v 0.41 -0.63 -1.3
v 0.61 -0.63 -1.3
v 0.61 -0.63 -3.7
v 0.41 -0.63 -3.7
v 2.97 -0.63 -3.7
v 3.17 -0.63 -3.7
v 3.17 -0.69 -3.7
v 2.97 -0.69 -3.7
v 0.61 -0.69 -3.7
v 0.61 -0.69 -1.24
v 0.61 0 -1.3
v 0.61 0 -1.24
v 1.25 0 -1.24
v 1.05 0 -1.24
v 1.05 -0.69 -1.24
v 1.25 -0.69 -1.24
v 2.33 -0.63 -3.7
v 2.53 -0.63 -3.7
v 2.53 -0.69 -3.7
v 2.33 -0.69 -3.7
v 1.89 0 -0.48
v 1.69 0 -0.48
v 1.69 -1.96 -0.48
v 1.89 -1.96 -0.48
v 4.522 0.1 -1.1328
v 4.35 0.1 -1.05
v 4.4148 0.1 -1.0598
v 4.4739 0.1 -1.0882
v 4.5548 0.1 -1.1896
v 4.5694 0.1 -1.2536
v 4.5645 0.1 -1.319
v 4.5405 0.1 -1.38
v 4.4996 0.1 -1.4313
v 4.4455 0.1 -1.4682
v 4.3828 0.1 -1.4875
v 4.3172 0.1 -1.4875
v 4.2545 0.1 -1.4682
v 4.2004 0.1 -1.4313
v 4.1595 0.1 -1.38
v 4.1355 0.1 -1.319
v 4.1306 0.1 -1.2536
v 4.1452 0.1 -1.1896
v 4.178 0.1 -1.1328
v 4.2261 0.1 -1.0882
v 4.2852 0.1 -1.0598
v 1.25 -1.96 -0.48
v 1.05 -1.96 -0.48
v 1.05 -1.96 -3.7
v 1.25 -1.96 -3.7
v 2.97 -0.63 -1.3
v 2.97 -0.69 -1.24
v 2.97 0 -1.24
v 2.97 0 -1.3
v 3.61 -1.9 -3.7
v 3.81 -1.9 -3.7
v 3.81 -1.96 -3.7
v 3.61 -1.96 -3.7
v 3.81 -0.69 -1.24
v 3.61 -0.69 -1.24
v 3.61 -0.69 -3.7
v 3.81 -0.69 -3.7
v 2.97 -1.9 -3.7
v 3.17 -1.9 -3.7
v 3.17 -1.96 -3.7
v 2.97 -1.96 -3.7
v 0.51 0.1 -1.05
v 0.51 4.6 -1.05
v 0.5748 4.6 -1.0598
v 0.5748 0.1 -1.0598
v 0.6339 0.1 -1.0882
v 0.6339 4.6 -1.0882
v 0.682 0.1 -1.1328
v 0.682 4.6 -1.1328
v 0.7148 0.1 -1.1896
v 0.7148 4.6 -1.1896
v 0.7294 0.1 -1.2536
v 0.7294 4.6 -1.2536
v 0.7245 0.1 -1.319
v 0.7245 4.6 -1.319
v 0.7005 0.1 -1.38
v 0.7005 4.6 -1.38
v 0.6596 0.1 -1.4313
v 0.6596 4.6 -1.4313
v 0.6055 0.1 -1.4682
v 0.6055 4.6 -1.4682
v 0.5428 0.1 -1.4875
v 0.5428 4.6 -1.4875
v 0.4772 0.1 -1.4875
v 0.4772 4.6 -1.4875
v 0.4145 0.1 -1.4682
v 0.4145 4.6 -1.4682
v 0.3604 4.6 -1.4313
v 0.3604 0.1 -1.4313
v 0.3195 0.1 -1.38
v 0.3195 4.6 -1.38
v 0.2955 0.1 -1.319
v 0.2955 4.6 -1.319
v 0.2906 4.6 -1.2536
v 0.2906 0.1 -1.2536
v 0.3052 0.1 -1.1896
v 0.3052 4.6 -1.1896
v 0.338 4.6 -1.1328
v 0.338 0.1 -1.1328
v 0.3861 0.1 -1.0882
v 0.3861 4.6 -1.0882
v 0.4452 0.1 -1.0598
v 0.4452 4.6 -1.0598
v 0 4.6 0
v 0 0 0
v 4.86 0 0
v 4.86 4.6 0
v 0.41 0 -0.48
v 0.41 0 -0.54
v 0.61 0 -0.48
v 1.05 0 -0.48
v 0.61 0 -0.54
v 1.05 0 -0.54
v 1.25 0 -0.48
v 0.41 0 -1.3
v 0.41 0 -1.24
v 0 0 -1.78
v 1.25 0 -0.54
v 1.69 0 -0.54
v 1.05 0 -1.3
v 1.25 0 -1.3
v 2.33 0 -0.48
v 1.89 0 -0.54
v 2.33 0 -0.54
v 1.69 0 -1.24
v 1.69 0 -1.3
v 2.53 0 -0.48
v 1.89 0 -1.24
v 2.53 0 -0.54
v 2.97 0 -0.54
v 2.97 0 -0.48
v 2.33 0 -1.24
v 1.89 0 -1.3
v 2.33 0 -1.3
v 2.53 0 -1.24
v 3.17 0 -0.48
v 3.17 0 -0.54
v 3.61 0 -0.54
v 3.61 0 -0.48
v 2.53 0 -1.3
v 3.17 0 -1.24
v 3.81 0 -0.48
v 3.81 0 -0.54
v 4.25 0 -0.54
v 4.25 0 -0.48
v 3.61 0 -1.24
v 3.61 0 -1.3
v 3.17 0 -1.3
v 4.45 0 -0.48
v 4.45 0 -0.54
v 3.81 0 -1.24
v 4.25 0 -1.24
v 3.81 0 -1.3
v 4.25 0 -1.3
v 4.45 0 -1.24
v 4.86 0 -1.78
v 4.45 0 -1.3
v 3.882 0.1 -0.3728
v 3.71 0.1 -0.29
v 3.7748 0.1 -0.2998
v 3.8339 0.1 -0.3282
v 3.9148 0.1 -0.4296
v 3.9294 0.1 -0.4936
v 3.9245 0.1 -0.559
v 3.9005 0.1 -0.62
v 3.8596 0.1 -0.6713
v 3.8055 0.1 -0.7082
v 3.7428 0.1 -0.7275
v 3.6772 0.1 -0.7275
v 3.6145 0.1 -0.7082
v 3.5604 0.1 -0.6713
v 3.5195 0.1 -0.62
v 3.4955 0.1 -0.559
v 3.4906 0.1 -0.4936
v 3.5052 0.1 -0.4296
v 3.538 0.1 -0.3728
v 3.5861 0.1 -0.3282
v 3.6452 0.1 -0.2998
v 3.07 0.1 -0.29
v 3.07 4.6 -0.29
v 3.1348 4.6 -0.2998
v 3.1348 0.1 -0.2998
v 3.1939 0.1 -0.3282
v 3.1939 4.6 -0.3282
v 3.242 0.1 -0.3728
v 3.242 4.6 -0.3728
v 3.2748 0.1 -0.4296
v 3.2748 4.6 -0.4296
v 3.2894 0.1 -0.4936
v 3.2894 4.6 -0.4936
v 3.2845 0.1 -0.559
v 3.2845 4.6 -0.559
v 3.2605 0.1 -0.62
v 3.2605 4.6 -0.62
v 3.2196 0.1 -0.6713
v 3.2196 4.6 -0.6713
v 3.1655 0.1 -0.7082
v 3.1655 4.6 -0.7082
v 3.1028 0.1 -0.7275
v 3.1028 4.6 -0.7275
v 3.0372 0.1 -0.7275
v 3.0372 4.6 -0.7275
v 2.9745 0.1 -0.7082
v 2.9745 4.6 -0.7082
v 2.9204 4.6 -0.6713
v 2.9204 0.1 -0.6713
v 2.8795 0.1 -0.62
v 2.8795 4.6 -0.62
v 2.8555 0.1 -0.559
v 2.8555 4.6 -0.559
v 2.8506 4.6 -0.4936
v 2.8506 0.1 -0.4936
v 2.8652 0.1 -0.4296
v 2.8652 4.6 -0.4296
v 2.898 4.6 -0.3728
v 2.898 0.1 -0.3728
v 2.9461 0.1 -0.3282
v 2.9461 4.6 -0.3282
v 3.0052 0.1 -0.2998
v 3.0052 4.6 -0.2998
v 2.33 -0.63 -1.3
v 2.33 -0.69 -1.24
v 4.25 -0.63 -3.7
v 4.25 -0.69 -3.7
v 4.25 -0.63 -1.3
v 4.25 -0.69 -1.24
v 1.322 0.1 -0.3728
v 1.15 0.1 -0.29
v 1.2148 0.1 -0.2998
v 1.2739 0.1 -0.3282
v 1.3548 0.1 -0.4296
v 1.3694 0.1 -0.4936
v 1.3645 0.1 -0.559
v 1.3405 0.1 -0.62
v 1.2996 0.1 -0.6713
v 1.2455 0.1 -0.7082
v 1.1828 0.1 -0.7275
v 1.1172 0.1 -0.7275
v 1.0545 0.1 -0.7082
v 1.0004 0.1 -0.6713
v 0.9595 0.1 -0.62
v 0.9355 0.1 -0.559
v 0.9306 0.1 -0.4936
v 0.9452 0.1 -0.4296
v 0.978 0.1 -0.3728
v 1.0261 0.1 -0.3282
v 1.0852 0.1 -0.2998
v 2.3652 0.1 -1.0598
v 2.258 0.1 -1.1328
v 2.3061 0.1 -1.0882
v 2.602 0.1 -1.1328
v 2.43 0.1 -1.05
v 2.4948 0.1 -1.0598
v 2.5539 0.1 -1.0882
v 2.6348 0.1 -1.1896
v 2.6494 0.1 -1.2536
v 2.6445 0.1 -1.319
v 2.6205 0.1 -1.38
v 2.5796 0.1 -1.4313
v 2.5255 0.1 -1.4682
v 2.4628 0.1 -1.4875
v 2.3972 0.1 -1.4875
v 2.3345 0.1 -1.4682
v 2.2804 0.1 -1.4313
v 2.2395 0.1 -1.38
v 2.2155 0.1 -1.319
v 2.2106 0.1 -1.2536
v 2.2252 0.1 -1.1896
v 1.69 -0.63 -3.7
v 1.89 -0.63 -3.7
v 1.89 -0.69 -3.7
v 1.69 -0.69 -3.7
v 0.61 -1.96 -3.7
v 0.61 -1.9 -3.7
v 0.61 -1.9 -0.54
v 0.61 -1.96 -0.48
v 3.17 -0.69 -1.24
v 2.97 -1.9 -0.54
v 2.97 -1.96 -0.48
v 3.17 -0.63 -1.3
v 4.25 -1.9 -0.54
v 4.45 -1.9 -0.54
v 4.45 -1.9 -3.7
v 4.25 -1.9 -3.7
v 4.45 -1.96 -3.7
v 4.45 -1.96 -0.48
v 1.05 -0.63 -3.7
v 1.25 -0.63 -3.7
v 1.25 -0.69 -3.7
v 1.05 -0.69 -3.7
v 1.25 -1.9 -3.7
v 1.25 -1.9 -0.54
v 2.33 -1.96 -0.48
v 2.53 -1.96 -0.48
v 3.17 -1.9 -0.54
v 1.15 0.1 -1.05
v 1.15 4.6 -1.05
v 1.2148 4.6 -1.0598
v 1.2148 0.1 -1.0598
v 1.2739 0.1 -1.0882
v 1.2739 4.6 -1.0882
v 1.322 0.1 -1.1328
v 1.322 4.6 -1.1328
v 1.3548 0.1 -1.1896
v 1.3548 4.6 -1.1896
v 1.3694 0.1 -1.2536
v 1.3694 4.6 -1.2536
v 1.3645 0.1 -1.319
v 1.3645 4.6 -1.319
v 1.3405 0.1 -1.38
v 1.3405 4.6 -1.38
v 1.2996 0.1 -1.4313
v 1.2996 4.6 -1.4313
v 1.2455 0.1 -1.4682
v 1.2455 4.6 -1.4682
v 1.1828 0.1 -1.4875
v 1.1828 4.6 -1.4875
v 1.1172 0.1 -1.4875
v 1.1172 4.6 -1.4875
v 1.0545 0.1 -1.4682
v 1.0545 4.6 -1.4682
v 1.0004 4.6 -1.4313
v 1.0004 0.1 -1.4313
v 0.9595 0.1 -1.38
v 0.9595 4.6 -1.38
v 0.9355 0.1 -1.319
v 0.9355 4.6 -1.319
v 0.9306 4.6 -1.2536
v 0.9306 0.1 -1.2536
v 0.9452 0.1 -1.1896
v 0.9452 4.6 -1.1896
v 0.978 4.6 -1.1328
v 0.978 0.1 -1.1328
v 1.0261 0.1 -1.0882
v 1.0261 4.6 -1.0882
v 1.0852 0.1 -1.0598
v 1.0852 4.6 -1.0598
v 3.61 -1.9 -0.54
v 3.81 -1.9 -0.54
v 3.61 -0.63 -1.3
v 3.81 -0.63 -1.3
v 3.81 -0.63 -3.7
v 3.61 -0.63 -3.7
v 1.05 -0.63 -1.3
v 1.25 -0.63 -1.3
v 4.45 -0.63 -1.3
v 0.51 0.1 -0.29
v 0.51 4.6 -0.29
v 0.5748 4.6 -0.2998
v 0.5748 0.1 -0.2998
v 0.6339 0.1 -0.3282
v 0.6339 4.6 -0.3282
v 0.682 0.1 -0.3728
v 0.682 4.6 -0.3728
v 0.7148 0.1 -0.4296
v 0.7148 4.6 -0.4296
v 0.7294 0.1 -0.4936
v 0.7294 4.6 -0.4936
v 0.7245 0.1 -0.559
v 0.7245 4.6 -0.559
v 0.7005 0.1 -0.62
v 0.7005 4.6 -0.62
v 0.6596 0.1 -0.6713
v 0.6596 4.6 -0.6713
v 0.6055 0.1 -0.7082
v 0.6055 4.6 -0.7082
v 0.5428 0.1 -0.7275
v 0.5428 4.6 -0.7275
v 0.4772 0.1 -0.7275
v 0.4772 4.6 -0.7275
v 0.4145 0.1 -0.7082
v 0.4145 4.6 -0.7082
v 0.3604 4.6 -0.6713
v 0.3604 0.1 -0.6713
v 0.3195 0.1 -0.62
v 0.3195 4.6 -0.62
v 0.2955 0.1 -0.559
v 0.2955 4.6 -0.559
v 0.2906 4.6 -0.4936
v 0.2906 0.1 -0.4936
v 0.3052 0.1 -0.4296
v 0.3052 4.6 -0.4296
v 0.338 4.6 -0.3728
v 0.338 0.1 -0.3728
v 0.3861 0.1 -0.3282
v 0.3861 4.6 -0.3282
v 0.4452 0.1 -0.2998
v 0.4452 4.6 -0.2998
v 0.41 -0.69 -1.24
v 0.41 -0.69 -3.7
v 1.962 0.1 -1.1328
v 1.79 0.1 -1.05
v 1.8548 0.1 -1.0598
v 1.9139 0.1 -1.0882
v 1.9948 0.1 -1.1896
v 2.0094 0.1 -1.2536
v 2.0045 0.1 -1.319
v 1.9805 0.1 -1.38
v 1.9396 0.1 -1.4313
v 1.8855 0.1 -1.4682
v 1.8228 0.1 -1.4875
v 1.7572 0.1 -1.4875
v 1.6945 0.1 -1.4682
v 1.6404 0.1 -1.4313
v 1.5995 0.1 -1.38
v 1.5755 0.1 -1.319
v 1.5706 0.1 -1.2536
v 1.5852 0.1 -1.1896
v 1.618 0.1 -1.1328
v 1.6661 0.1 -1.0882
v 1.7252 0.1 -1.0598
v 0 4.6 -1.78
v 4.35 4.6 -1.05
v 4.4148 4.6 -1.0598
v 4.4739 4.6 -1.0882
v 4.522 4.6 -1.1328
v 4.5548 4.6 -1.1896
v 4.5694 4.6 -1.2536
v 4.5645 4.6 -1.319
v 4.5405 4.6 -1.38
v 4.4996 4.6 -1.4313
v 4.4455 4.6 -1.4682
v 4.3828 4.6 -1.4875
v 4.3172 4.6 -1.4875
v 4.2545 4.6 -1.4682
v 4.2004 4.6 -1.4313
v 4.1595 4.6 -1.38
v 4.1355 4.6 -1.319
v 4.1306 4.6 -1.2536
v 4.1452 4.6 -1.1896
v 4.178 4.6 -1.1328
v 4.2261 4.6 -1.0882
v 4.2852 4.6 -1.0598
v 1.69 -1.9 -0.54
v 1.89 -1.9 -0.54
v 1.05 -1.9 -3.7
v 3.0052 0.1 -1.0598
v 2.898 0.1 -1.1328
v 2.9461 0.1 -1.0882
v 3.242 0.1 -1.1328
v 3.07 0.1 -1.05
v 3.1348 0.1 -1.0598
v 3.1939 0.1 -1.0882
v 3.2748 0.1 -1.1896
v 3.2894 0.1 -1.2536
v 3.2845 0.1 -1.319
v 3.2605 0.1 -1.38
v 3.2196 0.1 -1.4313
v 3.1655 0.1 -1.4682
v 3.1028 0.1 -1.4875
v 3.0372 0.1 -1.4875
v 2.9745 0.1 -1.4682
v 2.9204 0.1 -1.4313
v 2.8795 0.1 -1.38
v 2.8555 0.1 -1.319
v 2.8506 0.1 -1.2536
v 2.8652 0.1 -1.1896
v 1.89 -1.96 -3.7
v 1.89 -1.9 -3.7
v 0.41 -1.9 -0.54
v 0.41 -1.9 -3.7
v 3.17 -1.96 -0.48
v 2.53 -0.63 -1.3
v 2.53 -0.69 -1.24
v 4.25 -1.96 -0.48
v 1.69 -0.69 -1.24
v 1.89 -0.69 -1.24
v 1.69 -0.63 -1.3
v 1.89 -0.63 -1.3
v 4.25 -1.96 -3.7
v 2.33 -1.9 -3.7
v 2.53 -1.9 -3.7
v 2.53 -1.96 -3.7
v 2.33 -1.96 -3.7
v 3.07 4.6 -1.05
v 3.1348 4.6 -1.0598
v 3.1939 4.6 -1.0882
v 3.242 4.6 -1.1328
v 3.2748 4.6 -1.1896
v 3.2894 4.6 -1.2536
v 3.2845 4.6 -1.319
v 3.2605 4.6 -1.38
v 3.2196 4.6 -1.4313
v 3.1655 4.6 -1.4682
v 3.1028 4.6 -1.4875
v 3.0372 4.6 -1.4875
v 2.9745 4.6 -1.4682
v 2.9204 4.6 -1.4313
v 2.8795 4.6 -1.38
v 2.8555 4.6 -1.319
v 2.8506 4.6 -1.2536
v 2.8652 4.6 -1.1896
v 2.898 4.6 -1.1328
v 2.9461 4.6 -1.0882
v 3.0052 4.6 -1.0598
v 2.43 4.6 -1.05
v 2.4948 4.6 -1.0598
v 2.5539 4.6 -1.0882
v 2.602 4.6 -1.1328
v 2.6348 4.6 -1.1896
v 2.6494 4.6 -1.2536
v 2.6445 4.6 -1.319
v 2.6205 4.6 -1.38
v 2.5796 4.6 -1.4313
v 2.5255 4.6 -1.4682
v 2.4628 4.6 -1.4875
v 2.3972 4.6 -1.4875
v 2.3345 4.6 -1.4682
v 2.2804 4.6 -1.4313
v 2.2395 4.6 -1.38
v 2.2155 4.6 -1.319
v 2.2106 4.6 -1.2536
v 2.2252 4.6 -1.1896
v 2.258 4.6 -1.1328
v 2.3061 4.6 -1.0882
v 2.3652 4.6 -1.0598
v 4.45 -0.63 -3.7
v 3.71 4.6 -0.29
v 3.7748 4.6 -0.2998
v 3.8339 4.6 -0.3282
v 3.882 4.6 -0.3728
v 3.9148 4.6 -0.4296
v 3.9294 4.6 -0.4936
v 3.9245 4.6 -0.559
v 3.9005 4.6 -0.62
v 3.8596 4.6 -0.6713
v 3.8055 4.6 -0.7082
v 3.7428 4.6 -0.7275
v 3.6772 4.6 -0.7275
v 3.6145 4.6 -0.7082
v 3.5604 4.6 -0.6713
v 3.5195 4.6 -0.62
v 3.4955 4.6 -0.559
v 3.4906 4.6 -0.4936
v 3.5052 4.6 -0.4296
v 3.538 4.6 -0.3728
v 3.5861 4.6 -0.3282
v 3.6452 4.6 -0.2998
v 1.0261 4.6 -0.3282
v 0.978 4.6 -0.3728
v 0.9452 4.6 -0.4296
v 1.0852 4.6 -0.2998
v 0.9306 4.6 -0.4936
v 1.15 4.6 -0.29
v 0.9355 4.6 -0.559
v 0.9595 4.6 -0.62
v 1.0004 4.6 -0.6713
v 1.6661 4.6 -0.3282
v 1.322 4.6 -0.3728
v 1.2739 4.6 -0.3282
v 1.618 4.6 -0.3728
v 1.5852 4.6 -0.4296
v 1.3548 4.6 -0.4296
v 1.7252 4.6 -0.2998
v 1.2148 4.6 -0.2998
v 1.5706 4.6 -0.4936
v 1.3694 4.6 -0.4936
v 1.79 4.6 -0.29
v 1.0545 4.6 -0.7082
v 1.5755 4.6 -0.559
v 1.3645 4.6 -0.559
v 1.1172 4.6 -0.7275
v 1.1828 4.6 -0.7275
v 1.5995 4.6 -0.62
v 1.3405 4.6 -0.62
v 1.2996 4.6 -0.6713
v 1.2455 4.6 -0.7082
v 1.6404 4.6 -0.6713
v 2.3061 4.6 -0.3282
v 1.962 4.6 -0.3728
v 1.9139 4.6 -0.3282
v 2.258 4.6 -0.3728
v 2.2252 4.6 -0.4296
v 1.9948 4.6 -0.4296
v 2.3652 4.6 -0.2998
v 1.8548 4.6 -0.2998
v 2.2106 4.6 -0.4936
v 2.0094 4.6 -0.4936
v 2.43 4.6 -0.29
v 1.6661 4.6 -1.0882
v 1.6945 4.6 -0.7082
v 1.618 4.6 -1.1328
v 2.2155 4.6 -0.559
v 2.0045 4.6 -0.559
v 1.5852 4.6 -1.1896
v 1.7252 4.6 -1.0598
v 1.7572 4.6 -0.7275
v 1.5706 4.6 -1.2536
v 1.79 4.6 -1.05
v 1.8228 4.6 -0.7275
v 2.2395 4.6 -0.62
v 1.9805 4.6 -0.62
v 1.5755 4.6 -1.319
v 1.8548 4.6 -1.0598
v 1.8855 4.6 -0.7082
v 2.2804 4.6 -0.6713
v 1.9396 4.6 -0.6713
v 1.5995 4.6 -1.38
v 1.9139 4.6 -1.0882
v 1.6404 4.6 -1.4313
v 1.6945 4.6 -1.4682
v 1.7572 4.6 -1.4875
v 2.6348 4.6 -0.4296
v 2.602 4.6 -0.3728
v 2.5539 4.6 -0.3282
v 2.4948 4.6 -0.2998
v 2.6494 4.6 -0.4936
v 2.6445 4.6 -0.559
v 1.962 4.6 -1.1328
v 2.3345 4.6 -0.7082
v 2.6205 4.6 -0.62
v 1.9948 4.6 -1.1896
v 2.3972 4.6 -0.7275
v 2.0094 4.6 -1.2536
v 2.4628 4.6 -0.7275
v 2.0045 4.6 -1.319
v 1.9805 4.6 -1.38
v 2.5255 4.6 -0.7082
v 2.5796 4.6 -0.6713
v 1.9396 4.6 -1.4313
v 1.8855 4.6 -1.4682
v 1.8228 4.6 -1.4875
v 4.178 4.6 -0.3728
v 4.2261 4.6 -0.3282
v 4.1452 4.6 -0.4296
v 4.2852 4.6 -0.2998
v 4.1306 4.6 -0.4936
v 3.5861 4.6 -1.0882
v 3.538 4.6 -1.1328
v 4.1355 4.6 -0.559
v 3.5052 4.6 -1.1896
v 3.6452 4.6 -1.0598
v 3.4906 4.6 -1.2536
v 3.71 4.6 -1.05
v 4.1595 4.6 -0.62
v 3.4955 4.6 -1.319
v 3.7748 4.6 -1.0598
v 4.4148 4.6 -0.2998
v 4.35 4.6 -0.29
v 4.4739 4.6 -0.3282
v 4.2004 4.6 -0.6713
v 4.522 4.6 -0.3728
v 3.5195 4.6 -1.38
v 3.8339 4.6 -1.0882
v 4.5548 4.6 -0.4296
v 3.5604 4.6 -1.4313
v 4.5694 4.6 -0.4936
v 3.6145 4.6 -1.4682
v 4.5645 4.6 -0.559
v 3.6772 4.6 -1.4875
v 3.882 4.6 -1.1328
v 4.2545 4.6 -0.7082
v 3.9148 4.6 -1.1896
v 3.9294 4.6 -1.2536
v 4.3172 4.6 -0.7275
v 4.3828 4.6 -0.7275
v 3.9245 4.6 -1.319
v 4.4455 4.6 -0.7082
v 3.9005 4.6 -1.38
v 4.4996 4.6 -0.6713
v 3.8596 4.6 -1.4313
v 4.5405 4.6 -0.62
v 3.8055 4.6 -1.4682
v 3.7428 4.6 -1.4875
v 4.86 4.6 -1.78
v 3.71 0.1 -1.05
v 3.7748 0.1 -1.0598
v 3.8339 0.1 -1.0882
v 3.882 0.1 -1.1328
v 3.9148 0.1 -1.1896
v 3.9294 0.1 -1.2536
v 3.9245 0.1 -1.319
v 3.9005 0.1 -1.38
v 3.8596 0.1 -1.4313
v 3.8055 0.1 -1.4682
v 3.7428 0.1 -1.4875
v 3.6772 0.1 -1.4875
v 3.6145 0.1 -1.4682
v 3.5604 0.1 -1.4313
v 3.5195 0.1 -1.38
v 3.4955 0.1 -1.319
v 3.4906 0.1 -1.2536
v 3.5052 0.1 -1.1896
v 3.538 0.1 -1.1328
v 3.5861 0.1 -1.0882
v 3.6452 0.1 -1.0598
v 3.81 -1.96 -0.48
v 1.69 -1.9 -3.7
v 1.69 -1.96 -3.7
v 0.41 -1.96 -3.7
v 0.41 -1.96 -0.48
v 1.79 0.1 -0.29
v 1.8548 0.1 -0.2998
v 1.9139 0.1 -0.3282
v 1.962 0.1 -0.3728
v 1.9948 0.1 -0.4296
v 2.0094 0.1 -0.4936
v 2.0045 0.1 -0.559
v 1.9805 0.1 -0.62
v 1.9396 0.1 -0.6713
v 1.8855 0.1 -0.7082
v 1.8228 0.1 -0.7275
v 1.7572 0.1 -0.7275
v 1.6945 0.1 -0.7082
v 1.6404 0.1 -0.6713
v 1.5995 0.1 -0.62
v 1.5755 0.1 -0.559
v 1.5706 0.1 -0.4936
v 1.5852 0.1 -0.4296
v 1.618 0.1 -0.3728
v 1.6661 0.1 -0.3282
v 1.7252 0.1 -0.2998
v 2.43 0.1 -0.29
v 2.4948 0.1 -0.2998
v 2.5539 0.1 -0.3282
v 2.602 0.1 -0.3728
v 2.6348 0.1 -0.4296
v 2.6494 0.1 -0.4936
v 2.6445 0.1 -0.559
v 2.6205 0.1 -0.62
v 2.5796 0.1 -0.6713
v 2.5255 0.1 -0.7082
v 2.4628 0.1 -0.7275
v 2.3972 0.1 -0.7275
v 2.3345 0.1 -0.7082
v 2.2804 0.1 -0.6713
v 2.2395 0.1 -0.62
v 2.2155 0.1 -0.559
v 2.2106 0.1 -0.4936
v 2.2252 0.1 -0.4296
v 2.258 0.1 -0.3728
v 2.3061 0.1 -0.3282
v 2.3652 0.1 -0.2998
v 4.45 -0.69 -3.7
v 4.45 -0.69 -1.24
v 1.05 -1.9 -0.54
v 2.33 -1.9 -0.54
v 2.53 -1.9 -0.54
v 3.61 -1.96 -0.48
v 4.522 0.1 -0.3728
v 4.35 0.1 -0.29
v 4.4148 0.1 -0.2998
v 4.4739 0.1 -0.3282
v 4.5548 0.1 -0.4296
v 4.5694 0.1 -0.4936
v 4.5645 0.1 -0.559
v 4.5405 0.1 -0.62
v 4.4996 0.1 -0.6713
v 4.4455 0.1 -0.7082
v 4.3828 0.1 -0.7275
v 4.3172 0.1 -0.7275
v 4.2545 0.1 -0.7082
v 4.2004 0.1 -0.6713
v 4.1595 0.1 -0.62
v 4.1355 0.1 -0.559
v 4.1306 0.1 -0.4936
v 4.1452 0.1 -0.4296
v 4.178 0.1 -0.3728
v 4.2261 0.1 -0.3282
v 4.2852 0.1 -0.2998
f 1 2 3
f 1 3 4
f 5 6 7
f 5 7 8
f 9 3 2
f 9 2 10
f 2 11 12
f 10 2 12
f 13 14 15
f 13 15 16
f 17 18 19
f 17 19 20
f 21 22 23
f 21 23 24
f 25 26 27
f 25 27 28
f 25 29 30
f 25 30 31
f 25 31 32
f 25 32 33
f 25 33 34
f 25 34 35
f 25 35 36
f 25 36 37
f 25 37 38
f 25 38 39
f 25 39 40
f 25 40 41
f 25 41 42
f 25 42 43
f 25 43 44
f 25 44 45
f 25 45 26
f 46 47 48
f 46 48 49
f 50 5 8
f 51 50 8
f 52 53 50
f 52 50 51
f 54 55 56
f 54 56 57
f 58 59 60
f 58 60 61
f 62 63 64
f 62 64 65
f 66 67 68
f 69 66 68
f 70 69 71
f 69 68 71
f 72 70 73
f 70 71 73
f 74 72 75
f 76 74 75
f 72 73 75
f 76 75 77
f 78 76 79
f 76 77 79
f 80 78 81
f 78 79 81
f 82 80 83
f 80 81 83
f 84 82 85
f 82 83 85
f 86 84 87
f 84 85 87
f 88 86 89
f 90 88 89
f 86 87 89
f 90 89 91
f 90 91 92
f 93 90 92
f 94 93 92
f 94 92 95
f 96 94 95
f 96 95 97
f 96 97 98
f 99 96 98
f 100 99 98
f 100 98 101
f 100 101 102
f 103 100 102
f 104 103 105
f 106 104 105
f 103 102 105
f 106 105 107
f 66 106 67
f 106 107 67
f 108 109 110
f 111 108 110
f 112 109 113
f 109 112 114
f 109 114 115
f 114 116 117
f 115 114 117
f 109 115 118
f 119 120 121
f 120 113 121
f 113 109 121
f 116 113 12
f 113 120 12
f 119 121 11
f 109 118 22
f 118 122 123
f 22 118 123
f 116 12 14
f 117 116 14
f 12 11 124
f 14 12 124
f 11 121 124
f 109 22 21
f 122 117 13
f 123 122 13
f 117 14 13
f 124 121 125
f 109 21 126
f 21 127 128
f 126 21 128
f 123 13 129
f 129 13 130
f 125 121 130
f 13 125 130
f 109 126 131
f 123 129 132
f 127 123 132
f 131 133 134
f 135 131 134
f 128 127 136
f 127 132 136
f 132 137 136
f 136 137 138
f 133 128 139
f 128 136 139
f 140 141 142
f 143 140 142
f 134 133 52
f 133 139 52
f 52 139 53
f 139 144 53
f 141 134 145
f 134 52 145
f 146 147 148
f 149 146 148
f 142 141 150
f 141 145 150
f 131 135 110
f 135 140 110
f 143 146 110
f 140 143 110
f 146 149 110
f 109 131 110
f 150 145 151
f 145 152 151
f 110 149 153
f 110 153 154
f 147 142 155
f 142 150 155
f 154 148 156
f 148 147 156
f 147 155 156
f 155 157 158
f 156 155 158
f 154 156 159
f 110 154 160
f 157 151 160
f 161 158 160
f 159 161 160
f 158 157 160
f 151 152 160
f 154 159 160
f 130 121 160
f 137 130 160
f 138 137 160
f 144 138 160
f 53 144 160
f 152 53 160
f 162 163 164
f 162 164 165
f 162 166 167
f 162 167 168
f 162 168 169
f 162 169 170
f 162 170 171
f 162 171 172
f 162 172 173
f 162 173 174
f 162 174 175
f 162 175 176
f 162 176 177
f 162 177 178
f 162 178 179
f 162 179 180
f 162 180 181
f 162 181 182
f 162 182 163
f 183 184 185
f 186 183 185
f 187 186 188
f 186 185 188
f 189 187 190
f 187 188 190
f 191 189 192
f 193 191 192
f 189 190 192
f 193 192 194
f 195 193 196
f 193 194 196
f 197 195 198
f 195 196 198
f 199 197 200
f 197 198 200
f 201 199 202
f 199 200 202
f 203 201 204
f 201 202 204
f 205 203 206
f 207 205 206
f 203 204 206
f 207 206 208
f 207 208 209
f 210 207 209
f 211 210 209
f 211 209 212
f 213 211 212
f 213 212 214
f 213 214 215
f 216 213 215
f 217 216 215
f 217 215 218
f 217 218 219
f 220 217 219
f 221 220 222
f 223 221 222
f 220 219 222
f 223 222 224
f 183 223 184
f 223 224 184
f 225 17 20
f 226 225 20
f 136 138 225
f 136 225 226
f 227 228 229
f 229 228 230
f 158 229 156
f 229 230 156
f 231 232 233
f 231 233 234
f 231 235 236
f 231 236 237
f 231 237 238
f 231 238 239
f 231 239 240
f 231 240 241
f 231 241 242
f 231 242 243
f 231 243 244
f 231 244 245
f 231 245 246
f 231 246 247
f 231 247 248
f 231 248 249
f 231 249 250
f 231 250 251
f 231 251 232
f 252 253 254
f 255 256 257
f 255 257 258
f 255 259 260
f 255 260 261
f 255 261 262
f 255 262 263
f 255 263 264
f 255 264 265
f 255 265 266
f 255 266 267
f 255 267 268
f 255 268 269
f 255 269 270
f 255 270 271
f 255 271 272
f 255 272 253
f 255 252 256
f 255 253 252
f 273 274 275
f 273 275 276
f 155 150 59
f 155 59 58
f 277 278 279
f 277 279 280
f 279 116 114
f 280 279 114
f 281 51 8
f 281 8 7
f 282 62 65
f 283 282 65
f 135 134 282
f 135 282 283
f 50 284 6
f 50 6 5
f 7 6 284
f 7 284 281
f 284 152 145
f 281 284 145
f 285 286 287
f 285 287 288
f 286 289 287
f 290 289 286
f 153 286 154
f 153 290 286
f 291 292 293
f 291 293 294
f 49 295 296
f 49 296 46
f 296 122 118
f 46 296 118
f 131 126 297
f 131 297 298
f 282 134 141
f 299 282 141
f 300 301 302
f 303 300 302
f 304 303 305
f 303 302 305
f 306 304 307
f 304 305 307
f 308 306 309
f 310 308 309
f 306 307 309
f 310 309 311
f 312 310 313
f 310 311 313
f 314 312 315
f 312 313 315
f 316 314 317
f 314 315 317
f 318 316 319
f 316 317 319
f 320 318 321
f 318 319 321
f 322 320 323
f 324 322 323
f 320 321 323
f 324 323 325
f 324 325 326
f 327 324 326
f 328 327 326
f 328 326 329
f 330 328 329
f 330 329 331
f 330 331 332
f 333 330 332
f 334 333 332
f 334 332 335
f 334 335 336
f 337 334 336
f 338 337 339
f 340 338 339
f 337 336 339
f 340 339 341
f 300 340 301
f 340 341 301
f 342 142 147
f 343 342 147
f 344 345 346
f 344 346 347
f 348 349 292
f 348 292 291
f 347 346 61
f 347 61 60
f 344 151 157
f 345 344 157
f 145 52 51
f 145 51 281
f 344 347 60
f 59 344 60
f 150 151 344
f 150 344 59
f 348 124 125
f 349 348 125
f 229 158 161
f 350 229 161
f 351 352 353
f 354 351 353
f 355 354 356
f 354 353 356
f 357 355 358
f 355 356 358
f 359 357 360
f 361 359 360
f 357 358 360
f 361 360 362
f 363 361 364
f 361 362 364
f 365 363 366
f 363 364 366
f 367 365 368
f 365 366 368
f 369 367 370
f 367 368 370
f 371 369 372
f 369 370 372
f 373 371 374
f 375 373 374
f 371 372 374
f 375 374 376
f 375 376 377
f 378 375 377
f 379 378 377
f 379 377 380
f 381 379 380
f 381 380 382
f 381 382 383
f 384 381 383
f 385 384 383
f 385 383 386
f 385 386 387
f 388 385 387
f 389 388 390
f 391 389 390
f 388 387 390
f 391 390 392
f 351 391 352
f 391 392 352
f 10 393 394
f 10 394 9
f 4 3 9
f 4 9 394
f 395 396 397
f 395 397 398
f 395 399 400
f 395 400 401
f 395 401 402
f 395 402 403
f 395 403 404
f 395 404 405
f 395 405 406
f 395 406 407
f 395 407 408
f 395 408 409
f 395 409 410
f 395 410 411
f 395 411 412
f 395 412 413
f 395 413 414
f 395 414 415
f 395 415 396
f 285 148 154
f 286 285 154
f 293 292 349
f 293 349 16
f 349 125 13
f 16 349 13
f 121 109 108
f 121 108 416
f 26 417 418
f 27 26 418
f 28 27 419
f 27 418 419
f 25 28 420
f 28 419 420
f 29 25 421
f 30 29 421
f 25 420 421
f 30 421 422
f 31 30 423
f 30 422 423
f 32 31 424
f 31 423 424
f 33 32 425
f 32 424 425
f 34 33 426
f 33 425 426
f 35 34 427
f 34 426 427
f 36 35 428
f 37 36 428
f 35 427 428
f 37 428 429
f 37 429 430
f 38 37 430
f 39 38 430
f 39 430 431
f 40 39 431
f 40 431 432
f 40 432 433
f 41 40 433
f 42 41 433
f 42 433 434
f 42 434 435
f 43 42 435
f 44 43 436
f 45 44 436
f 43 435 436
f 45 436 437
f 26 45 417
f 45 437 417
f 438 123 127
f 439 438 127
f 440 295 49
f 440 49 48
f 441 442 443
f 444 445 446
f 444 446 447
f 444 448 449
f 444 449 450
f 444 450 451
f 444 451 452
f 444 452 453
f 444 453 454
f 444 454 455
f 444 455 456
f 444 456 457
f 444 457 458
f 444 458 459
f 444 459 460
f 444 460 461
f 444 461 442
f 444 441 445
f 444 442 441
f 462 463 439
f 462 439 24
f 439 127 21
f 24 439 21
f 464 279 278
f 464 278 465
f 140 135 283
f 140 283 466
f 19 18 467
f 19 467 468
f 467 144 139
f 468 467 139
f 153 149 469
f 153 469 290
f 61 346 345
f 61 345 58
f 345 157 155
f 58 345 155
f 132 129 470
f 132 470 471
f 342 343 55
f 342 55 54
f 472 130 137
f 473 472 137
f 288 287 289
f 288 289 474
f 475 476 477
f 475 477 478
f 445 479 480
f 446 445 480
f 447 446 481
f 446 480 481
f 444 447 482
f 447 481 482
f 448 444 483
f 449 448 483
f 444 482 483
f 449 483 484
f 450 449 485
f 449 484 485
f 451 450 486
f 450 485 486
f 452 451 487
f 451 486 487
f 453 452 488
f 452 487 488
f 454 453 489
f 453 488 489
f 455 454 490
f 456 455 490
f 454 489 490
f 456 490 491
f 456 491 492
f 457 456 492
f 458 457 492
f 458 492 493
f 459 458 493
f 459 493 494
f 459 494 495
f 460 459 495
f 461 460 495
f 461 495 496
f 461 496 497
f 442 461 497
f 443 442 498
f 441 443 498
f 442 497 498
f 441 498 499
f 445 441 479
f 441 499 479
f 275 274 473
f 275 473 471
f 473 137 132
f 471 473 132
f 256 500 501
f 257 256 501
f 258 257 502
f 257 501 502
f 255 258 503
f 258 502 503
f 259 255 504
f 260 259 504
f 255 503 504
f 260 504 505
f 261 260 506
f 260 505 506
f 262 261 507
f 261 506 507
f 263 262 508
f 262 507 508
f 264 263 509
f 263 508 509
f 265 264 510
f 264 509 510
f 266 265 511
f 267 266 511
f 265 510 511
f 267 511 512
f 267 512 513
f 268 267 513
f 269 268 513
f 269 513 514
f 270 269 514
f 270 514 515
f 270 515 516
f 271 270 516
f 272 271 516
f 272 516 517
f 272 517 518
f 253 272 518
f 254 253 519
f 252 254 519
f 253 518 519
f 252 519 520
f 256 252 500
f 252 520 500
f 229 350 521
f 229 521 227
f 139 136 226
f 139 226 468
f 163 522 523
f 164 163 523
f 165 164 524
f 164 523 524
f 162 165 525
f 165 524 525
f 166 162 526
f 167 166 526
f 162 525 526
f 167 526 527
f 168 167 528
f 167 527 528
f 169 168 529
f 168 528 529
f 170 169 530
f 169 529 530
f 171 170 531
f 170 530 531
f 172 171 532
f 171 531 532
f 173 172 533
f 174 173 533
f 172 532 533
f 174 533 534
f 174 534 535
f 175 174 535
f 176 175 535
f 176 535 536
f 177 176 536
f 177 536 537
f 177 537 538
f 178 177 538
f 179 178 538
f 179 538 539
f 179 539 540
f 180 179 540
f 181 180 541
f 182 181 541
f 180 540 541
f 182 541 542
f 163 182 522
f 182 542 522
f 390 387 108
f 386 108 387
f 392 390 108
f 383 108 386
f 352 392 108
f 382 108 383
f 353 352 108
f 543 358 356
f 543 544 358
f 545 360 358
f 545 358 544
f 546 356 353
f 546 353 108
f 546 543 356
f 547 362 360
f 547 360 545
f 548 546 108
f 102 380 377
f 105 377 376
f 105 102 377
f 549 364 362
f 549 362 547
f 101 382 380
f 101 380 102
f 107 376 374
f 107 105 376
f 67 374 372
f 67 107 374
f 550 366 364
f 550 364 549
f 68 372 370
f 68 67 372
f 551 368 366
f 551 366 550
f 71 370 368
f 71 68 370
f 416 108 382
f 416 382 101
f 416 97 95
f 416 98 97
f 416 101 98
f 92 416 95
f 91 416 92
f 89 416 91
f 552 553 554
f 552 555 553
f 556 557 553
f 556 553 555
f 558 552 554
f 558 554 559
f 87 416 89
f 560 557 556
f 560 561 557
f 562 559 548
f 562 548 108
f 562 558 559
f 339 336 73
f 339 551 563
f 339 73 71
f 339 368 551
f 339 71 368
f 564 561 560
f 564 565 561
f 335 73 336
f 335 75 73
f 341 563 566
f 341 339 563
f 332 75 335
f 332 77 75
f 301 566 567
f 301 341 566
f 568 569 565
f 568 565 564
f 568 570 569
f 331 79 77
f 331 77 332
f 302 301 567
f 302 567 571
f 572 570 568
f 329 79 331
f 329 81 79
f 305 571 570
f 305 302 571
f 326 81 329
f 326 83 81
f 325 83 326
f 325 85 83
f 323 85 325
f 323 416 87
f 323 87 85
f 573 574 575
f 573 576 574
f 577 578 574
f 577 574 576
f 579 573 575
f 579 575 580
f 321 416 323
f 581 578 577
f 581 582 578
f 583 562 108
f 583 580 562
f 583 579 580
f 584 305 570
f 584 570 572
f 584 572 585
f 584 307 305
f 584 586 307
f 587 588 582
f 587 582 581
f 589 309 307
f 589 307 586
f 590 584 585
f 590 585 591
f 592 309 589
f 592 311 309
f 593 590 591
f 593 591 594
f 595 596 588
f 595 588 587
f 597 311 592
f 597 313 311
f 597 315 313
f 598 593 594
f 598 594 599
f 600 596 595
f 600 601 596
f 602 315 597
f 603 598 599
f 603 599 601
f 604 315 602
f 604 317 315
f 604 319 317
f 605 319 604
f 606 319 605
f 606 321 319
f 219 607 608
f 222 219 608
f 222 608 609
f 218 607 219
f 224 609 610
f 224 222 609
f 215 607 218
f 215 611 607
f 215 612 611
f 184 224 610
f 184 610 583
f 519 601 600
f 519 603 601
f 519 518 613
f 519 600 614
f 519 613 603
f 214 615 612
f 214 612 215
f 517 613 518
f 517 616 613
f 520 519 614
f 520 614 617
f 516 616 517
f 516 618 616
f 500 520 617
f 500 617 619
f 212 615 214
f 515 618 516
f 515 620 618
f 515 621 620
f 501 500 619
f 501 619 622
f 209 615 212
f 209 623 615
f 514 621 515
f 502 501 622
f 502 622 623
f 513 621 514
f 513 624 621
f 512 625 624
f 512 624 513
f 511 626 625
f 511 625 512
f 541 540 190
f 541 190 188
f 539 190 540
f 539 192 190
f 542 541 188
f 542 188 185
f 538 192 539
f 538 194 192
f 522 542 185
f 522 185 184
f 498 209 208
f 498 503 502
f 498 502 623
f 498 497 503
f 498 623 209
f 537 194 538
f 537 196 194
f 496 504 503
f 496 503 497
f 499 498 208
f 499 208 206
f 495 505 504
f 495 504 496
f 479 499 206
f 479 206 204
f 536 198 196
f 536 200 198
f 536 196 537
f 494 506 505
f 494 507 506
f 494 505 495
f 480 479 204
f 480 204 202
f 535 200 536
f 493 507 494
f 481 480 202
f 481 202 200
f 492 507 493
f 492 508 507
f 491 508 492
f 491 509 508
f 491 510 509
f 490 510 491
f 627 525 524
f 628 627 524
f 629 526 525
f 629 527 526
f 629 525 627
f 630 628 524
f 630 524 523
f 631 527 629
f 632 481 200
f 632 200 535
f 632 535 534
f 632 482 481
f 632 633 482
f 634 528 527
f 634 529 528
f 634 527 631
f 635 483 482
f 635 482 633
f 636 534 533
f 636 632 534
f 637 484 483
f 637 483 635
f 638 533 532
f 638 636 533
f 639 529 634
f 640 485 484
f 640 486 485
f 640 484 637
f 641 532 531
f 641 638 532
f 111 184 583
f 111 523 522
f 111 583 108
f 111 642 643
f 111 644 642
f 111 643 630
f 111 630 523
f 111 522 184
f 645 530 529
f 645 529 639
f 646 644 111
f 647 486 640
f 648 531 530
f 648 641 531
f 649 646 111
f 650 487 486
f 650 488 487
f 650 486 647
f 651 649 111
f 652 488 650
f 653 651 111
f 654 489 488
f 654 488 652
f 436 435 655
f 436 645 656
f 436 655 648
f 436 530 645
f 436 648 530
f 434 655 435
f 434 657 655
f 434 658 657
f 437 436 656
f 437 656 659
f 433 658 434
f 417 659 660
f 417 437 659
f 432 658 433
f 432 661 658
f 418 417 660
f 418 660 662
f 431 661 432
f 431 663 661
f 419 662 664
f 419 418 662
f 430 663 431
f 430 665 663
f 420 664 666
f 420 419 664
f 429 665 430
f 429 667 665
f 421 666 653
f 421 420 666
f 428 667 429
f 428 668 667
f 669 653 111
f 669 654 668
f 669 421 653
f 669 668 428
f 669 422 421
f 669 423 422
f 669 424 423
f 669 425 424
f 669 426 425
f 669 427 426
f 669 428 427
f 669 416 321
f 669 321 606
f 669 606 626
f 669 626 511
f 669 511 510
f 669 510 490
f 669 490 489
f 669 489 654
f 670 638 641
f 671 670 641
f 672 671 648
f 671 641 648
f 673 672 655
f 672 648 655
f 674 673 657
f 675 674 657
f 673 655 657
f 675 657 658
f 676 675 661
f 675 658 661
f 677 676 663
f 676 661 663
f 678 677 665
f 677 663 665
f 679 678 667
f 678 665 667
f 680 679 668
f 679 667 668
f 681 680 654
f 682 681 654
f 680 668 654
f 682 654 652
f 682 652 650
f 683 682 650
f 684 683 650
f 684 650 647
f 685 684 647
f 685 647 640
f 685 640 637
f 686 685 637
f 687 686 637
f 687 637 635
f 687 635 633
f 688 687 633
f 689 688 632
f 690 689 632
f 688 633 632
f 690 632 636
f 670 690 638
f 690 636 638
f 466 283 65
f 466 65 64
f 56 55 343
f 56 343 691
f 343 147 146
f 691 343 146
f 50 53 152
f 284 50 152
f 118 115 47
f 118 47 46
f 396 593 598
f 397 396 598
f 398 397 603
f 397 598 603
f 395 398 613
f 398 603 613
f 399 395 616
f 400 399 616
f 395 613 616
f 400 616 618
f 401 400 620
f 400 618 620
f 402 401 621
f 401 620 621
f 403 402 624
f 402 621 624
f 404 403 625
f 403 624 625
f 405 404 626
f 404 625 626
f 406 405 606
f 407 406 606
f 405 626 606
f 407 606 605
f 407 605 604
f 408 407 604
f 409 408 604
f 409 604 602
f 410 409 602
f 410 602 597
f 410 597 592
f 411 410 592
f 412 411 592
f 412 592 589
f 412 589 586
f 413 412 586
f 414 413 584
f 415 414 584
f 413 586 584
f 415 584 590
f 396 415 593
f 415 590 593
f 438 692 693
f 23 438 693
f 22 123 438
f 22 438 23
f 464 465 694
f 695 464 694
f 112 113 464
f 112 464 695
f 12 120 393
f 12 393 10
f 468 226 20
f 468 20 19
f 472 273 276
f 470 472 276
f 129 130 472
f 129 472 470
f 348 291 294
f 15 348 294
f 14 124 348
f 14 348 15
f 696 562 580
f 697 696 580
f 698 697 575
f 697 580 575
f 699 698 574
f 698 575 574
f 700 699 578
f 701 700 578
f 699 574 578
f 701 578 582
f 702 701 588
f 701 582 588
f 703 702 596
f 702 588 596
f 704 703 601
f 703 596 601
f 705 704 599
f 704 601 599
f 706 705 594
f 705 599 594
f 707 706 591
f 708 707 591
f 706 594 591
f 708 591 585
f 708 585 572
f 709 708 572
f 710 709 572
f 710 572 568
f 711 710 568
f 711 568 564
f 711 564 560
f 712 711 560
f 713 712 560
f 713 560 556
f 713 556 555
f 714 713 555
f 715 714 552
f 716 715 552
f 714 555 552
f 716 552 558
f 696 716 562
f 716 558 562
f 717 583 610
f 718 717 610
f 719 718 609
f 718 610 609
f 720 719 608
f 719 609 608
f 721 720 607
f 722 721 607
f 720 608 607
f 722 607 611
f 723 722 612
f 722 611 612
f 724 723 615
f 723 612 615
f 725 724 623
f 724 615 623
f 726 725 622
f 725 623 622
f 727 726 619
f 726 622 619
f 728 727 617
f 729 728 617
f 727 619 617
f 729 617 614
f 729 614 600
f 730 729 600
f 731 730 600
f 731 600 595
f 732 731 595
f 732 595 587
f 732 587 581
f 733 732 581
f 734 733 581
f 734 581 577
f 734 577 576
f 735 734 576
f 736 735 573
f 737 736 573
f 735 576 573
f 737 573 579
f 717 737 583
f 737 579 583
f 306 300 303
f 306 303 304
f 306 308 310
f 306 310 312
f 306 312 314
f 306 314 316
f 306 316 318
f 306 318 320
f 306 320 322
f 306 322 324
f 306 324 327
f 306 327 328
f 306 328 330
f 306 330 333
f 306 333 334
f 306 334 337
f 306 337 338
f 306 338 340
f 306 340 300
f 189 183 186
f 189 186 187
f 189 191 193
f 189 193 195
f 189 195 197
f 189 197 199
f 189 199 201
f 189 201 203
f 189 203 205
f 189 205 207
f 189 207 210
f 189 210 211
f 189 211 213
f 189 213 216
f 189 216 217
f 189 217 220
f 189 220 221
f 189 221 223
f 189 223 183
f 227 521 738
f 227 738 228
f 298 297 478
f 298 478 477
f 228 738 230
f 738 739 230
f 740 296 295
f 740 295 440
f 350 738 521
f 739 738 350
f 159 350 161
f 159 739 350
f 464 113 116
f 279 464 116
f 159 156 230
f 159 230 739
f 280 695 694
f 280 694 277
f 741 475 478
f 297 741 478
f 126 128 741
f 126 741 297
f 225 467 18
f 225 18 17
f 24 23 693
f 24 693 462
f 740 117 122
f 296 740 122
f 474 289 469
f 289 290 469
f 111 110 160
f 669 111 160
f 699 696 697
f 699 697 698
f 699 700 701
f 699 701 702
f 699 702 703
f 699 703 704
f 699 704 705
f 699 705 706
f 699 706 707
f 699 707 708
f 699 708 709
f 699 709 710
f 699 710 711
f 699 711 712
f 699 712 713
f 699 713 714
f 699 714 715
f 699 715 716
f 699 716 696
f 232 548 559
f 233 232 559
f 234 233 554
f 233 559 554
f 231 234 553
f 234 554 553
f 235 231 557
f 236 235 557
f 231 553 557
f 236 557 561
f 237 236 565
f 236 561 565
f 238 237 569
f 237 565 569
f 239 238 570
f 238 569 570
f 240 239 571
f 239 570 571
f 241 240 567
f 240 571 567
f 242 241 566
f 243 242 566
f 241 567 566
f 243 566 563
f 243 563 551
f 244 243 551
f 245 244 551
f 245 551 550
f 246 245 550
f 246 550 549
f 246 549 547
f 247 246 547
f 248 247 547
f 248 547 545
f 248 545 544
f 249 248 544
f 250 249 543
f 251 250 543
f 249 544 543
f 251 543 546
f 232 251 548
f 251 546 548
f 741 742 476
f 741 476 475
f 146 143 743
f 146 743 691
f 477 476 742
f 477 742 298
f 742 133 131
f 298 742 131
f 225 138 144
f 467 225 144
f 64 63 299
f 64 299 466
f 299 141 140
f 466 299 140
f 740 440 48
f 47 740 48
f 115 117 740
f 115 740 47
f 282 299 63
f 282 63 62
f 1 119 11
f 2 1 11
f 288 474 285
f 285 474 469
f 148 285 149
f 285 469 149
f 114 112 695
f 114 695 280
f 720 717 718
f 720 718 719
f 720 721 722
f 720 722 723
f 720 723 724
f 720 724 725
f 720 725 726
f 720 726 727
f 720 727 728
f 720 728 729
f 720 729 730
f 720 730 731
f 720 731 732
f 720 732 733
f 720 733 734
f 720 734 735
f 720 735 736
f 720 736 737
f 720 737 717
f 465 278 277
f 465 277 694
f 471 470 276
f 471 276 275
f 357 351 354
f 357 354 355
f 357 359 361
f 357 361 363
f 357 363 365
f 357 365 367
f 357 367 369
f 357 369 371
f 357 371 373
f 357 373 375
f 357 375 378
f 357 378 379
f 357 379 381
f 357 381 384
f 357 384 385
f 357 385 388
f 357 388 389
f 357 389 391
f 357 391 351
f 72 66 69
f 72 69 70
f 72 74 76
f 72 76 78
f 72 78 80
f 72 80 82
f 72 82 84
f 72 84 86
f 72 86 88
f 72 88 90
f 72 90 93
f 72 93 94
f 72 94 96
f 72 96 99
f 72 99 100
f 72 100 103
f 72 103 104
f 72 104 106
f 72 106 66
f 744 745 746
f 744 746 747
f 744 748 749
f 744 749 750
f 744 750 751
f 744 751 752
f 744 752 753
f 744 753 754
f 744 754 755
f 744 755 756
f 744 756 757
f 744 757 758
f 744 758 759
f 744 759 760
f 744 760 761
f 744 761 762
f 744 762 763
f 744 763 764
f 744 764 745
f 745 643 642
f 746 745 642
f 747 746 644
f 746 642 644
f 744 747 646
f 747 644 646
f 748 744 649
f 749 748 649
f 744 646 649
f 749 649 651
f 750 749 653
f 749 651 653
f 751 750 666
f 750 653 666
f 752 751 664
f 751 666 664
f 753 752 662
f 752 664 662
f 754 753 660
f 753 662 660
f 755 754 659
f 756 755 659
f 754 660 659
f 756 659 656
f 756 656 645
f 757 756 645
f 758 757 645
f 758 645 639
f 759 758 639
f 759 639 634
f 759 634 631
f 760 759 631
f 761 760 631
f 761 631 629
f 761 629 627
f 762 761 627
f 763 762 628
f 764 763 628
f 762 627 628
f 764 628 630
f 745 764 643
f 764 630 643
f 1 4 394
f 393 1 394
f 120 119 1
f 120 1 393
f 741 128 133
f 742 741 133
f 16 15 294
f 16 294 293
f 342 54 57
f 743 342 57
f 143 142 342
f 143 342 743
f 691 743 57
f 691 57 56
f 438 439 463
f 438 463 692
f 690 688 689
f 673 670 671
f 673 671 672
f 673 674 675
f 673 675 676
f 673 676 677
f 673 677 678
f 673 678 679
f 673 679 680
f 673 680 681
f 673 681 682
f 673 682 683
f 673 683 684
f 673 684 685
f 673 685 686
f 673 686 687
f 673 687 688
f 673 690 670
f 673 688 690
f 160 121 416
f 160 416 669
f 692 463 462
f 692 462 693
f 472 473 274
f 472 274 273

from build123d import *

# Parameters (mm, degrees)
SKETCH2_W           = 4.86
SKETCH2_H           = 1.78
BOSS_EXTRUDE1_DEPTH = 4.6
SKETCH3_R           = 0.22
CUT_EXTRUDE1_DEPTH  = 4.5
SKETCH4_W           = 0.2
SKETCH4_H           = 0.06
BOSS_EXTRUDE2_DEPTH = 1.96
SKETCH6_W           = 0.2
SKETCH6_H           = 0.06
BOSS_EXTRUDE3_DEPTH = 0.69
SKETCH7_W           = 0.2
SKETCH7_H           = 0.06
BOSS_EXTRUDE4_DEPTH = 2.4
SKETCH8_W           = 0.2
SKETCH8_H           = 0.06
BOSS_EXTRUDE5_DEPTH = 3.16


with BuildPart() as part:
    # Sketch2 → Boss-Extrude1 (new body)
    with BuildSketch(Plane(origin=(0, 0, 0), x_dir=(1, 0, 0), z_dir=(0, 1, 0))):
        with Locations((2.43, 0.89)):
            Rectangle(SKETCH2_W, SKETCH2_H)
    extrude(amount=BOSS_EXTRUDE1_DEPTH)

    # Sketch3 → Cut-Extrude1 (cut)
    with BuildSketch(Plane(origin=(0, 4.6, 0), x_dir=(1, 0, 0), z_dir=(0, 1, 0))):
        with Locations(Location((0.51, 1.27, 0), (0, 0, 270))):
            Circle(SKETCH3_R)
        with Locations(Location((1.15, 1.27, 0), (0, 0, 270))):
            Circle(SKETCH3_R)
        with Locations(Location((1.79, 1.27, 0), (0, 0, 270))):
            Circle(SKETCH3_R)
        with Locations(Location((2.43, 1.27, 0), (0, 0, 270))):
            Circle(SKETCH3_R)
        with Locations(Location((3.07, 1.27, 0), (0, 0, 270))):
            Circle(SKETCH3_R)
        with Locations(Location((3.71, 1.27, 0), (0, 0, 270))):
            Circle(SKETCH3_R)
        with Locations(Location((4.35, 1.27, 0), (0, 0, 270))):
            Circle(SKETCH3_R)
        with Locations(Location((1.15, 0.51, 0), (0, 0, 270))):
            Circle(SKETCH3_R)
        with Locations(Location((1.79, 0.51, 0), (0, 0, 270))):
            Circle(SKETCH3_R)
        with Locations(Location((2.43, 0.51, 0), (0, 0, 270))):
            Circle(SKETCH3_R)
        with Locations(Location((3.07, 0.51, 0), (0, 0, 270))):
            Circle(SKETCH3_R)
        with Locations(Location((3.71, 0.51, 0), (0, 0, 270))):
            Circle(SKETCH3_R)
        with Locations(Location((4.35, 0.51, 0), (0, 0, 270))):
            Circle(SKETCH3_R)
        with Locations(Location((0.51, 0.51, 0), (0, 0, 270))):
            Circle(SKETCH3_R)
    extrude(amount=-CUT_EXTRUDE1_DEPTH, mode=Mode.SUBTRACT)

    # Sketch4 → Boss-Extrude2 (add)
    with BuildSketch(Plane.XZ):
        with Locations((0.51, -0.51)):
            Rectangle(SKETCH4_W, SKETCH4_H)
        with Locations((1.15, -0.51)):
            Rectangle(SKETCH4_W, SKETCH4_H)
        with Locations((1.79, -0.51)):
            Rectangle(SKETCH4_W, SKETCH4_H)
        with Locations((2.43, -0.51)):
            Rectangle(SKETCH4_W, SKETCH4_H)
        with Locations((3.07, -0.51)):
            Rectangle(SKETCH4_W, SKETCH4_H)
        with Locations((3.71, -0.51)):
            Rectangle(SKETCH4_W, SKETCH4_H)
        with Locations((4.35, -0.51)):
            Rectangle(SKETCH4_W, SKETCH4_H)
    extrude(amount=BOSS_EXTRUDE2_DEPTH)

    # Sketch6 → Boss-Extrude3 (add)
    with BuildSketch(Plane.XZ):
        with Locations((0.51, -1.27)):
            Rectangle(SKETCH6_W, SKETCH6_H)
        with Locations((1.15, -1.27)):
            Rectangle(SKETCH6_W, SKETCH6_H)
        with Locations((1.79, -1.27)):
            Rectangle(SKETCH6_W, SKETCH6_H)
        with Locations((2.43, -1.27)):
            Rectangle(SKETCH6_W, SKETCH6_H)
        with Locations((3.07, -1.27)):
            Rectangle(SKETCH6_W, SKETCH6_H)
        with Locations((3.71, -1.27)):
            Rectangle(SKETCH6_W, SKETCH6_H)
        with Locations((4.35, -1.27)):
            Rectangle(SKETCH6_W, SKETCH6_H)
    extrude(amount=BOSS_EXTRUDE3_DEPTH)

    # Sketch7 → Boss-Extrude4 (add)
    with BuildSketch(Plane(origin=(0, 0, -1.3), x_dir=(-1, 0, 0), z_dir=(0, 0, -1))):
        with Locations((-4.35, -0.66)):
            Rectangle(SKETCH7_W, SKETCH7_H)
        with Locations((-3.71, -0.66)):
            Rectangle(SKETCH7_W, SKETCH7_H)
        with Locations((-3.07, -0.66)):
            Rectangle(SKETCH7_W, SKETCH7_H)
        with Locations((-2.43, -0.66)):
            Rectangle(SKETCH7_W, SKETCH7_H)
        with Locations((-1.79, -0.66)):
            Rectangle(SKETCH7_W, SKETCH7_H)
        with Locations((-1.15, -0.66)):
            Rectangle(SKETCH7_W, SKETCH7_H)
        with Locations((-0.51, -0.66)):
            Rectangle(SKETCH7_W, SKETCH7_H)
    extrude(amount=BOSS_EXTRUDE4_DEPTH)

    # Sketch8 → Boss-Extrude5 (add)
    with BuildSketch(Plane(origin=(0, 0, -0.54), x_dir=(-1, 0, 0), z_dir=(0, 0, -1))):
        with Locations((-4.35, -1.93)):
            Rectangle(SKETCH8_W, SKETCH8_H)
        with Locations((-3.71, -1.93)):
            Rectangle(SKETCH8_W, SKETCH8_H)
        with Locations((-3.07, -1.93)):
            Rectangle(SKETCH8_W, SKETCH8_H)
        with Locations((-2.43, -1.93)):
            Rectangle(SKETCH8_W, SKETCH8_H)
        with Locations((-1.79, -1.93)):
            Rectangle(SKETCH8_W, SKETCH8_H)
        with Locations((-1.15, -1.93)):
            Rectangle(SKETCH8_W, SKETCH8_H)
        with Locations((-0.51, -1.93)):
            Rectangle(SKETCH8_W, SKETCH8_H)
    extrude(amount=BOSS_EXTRUDE5_DEPTH)


solid = part.part
